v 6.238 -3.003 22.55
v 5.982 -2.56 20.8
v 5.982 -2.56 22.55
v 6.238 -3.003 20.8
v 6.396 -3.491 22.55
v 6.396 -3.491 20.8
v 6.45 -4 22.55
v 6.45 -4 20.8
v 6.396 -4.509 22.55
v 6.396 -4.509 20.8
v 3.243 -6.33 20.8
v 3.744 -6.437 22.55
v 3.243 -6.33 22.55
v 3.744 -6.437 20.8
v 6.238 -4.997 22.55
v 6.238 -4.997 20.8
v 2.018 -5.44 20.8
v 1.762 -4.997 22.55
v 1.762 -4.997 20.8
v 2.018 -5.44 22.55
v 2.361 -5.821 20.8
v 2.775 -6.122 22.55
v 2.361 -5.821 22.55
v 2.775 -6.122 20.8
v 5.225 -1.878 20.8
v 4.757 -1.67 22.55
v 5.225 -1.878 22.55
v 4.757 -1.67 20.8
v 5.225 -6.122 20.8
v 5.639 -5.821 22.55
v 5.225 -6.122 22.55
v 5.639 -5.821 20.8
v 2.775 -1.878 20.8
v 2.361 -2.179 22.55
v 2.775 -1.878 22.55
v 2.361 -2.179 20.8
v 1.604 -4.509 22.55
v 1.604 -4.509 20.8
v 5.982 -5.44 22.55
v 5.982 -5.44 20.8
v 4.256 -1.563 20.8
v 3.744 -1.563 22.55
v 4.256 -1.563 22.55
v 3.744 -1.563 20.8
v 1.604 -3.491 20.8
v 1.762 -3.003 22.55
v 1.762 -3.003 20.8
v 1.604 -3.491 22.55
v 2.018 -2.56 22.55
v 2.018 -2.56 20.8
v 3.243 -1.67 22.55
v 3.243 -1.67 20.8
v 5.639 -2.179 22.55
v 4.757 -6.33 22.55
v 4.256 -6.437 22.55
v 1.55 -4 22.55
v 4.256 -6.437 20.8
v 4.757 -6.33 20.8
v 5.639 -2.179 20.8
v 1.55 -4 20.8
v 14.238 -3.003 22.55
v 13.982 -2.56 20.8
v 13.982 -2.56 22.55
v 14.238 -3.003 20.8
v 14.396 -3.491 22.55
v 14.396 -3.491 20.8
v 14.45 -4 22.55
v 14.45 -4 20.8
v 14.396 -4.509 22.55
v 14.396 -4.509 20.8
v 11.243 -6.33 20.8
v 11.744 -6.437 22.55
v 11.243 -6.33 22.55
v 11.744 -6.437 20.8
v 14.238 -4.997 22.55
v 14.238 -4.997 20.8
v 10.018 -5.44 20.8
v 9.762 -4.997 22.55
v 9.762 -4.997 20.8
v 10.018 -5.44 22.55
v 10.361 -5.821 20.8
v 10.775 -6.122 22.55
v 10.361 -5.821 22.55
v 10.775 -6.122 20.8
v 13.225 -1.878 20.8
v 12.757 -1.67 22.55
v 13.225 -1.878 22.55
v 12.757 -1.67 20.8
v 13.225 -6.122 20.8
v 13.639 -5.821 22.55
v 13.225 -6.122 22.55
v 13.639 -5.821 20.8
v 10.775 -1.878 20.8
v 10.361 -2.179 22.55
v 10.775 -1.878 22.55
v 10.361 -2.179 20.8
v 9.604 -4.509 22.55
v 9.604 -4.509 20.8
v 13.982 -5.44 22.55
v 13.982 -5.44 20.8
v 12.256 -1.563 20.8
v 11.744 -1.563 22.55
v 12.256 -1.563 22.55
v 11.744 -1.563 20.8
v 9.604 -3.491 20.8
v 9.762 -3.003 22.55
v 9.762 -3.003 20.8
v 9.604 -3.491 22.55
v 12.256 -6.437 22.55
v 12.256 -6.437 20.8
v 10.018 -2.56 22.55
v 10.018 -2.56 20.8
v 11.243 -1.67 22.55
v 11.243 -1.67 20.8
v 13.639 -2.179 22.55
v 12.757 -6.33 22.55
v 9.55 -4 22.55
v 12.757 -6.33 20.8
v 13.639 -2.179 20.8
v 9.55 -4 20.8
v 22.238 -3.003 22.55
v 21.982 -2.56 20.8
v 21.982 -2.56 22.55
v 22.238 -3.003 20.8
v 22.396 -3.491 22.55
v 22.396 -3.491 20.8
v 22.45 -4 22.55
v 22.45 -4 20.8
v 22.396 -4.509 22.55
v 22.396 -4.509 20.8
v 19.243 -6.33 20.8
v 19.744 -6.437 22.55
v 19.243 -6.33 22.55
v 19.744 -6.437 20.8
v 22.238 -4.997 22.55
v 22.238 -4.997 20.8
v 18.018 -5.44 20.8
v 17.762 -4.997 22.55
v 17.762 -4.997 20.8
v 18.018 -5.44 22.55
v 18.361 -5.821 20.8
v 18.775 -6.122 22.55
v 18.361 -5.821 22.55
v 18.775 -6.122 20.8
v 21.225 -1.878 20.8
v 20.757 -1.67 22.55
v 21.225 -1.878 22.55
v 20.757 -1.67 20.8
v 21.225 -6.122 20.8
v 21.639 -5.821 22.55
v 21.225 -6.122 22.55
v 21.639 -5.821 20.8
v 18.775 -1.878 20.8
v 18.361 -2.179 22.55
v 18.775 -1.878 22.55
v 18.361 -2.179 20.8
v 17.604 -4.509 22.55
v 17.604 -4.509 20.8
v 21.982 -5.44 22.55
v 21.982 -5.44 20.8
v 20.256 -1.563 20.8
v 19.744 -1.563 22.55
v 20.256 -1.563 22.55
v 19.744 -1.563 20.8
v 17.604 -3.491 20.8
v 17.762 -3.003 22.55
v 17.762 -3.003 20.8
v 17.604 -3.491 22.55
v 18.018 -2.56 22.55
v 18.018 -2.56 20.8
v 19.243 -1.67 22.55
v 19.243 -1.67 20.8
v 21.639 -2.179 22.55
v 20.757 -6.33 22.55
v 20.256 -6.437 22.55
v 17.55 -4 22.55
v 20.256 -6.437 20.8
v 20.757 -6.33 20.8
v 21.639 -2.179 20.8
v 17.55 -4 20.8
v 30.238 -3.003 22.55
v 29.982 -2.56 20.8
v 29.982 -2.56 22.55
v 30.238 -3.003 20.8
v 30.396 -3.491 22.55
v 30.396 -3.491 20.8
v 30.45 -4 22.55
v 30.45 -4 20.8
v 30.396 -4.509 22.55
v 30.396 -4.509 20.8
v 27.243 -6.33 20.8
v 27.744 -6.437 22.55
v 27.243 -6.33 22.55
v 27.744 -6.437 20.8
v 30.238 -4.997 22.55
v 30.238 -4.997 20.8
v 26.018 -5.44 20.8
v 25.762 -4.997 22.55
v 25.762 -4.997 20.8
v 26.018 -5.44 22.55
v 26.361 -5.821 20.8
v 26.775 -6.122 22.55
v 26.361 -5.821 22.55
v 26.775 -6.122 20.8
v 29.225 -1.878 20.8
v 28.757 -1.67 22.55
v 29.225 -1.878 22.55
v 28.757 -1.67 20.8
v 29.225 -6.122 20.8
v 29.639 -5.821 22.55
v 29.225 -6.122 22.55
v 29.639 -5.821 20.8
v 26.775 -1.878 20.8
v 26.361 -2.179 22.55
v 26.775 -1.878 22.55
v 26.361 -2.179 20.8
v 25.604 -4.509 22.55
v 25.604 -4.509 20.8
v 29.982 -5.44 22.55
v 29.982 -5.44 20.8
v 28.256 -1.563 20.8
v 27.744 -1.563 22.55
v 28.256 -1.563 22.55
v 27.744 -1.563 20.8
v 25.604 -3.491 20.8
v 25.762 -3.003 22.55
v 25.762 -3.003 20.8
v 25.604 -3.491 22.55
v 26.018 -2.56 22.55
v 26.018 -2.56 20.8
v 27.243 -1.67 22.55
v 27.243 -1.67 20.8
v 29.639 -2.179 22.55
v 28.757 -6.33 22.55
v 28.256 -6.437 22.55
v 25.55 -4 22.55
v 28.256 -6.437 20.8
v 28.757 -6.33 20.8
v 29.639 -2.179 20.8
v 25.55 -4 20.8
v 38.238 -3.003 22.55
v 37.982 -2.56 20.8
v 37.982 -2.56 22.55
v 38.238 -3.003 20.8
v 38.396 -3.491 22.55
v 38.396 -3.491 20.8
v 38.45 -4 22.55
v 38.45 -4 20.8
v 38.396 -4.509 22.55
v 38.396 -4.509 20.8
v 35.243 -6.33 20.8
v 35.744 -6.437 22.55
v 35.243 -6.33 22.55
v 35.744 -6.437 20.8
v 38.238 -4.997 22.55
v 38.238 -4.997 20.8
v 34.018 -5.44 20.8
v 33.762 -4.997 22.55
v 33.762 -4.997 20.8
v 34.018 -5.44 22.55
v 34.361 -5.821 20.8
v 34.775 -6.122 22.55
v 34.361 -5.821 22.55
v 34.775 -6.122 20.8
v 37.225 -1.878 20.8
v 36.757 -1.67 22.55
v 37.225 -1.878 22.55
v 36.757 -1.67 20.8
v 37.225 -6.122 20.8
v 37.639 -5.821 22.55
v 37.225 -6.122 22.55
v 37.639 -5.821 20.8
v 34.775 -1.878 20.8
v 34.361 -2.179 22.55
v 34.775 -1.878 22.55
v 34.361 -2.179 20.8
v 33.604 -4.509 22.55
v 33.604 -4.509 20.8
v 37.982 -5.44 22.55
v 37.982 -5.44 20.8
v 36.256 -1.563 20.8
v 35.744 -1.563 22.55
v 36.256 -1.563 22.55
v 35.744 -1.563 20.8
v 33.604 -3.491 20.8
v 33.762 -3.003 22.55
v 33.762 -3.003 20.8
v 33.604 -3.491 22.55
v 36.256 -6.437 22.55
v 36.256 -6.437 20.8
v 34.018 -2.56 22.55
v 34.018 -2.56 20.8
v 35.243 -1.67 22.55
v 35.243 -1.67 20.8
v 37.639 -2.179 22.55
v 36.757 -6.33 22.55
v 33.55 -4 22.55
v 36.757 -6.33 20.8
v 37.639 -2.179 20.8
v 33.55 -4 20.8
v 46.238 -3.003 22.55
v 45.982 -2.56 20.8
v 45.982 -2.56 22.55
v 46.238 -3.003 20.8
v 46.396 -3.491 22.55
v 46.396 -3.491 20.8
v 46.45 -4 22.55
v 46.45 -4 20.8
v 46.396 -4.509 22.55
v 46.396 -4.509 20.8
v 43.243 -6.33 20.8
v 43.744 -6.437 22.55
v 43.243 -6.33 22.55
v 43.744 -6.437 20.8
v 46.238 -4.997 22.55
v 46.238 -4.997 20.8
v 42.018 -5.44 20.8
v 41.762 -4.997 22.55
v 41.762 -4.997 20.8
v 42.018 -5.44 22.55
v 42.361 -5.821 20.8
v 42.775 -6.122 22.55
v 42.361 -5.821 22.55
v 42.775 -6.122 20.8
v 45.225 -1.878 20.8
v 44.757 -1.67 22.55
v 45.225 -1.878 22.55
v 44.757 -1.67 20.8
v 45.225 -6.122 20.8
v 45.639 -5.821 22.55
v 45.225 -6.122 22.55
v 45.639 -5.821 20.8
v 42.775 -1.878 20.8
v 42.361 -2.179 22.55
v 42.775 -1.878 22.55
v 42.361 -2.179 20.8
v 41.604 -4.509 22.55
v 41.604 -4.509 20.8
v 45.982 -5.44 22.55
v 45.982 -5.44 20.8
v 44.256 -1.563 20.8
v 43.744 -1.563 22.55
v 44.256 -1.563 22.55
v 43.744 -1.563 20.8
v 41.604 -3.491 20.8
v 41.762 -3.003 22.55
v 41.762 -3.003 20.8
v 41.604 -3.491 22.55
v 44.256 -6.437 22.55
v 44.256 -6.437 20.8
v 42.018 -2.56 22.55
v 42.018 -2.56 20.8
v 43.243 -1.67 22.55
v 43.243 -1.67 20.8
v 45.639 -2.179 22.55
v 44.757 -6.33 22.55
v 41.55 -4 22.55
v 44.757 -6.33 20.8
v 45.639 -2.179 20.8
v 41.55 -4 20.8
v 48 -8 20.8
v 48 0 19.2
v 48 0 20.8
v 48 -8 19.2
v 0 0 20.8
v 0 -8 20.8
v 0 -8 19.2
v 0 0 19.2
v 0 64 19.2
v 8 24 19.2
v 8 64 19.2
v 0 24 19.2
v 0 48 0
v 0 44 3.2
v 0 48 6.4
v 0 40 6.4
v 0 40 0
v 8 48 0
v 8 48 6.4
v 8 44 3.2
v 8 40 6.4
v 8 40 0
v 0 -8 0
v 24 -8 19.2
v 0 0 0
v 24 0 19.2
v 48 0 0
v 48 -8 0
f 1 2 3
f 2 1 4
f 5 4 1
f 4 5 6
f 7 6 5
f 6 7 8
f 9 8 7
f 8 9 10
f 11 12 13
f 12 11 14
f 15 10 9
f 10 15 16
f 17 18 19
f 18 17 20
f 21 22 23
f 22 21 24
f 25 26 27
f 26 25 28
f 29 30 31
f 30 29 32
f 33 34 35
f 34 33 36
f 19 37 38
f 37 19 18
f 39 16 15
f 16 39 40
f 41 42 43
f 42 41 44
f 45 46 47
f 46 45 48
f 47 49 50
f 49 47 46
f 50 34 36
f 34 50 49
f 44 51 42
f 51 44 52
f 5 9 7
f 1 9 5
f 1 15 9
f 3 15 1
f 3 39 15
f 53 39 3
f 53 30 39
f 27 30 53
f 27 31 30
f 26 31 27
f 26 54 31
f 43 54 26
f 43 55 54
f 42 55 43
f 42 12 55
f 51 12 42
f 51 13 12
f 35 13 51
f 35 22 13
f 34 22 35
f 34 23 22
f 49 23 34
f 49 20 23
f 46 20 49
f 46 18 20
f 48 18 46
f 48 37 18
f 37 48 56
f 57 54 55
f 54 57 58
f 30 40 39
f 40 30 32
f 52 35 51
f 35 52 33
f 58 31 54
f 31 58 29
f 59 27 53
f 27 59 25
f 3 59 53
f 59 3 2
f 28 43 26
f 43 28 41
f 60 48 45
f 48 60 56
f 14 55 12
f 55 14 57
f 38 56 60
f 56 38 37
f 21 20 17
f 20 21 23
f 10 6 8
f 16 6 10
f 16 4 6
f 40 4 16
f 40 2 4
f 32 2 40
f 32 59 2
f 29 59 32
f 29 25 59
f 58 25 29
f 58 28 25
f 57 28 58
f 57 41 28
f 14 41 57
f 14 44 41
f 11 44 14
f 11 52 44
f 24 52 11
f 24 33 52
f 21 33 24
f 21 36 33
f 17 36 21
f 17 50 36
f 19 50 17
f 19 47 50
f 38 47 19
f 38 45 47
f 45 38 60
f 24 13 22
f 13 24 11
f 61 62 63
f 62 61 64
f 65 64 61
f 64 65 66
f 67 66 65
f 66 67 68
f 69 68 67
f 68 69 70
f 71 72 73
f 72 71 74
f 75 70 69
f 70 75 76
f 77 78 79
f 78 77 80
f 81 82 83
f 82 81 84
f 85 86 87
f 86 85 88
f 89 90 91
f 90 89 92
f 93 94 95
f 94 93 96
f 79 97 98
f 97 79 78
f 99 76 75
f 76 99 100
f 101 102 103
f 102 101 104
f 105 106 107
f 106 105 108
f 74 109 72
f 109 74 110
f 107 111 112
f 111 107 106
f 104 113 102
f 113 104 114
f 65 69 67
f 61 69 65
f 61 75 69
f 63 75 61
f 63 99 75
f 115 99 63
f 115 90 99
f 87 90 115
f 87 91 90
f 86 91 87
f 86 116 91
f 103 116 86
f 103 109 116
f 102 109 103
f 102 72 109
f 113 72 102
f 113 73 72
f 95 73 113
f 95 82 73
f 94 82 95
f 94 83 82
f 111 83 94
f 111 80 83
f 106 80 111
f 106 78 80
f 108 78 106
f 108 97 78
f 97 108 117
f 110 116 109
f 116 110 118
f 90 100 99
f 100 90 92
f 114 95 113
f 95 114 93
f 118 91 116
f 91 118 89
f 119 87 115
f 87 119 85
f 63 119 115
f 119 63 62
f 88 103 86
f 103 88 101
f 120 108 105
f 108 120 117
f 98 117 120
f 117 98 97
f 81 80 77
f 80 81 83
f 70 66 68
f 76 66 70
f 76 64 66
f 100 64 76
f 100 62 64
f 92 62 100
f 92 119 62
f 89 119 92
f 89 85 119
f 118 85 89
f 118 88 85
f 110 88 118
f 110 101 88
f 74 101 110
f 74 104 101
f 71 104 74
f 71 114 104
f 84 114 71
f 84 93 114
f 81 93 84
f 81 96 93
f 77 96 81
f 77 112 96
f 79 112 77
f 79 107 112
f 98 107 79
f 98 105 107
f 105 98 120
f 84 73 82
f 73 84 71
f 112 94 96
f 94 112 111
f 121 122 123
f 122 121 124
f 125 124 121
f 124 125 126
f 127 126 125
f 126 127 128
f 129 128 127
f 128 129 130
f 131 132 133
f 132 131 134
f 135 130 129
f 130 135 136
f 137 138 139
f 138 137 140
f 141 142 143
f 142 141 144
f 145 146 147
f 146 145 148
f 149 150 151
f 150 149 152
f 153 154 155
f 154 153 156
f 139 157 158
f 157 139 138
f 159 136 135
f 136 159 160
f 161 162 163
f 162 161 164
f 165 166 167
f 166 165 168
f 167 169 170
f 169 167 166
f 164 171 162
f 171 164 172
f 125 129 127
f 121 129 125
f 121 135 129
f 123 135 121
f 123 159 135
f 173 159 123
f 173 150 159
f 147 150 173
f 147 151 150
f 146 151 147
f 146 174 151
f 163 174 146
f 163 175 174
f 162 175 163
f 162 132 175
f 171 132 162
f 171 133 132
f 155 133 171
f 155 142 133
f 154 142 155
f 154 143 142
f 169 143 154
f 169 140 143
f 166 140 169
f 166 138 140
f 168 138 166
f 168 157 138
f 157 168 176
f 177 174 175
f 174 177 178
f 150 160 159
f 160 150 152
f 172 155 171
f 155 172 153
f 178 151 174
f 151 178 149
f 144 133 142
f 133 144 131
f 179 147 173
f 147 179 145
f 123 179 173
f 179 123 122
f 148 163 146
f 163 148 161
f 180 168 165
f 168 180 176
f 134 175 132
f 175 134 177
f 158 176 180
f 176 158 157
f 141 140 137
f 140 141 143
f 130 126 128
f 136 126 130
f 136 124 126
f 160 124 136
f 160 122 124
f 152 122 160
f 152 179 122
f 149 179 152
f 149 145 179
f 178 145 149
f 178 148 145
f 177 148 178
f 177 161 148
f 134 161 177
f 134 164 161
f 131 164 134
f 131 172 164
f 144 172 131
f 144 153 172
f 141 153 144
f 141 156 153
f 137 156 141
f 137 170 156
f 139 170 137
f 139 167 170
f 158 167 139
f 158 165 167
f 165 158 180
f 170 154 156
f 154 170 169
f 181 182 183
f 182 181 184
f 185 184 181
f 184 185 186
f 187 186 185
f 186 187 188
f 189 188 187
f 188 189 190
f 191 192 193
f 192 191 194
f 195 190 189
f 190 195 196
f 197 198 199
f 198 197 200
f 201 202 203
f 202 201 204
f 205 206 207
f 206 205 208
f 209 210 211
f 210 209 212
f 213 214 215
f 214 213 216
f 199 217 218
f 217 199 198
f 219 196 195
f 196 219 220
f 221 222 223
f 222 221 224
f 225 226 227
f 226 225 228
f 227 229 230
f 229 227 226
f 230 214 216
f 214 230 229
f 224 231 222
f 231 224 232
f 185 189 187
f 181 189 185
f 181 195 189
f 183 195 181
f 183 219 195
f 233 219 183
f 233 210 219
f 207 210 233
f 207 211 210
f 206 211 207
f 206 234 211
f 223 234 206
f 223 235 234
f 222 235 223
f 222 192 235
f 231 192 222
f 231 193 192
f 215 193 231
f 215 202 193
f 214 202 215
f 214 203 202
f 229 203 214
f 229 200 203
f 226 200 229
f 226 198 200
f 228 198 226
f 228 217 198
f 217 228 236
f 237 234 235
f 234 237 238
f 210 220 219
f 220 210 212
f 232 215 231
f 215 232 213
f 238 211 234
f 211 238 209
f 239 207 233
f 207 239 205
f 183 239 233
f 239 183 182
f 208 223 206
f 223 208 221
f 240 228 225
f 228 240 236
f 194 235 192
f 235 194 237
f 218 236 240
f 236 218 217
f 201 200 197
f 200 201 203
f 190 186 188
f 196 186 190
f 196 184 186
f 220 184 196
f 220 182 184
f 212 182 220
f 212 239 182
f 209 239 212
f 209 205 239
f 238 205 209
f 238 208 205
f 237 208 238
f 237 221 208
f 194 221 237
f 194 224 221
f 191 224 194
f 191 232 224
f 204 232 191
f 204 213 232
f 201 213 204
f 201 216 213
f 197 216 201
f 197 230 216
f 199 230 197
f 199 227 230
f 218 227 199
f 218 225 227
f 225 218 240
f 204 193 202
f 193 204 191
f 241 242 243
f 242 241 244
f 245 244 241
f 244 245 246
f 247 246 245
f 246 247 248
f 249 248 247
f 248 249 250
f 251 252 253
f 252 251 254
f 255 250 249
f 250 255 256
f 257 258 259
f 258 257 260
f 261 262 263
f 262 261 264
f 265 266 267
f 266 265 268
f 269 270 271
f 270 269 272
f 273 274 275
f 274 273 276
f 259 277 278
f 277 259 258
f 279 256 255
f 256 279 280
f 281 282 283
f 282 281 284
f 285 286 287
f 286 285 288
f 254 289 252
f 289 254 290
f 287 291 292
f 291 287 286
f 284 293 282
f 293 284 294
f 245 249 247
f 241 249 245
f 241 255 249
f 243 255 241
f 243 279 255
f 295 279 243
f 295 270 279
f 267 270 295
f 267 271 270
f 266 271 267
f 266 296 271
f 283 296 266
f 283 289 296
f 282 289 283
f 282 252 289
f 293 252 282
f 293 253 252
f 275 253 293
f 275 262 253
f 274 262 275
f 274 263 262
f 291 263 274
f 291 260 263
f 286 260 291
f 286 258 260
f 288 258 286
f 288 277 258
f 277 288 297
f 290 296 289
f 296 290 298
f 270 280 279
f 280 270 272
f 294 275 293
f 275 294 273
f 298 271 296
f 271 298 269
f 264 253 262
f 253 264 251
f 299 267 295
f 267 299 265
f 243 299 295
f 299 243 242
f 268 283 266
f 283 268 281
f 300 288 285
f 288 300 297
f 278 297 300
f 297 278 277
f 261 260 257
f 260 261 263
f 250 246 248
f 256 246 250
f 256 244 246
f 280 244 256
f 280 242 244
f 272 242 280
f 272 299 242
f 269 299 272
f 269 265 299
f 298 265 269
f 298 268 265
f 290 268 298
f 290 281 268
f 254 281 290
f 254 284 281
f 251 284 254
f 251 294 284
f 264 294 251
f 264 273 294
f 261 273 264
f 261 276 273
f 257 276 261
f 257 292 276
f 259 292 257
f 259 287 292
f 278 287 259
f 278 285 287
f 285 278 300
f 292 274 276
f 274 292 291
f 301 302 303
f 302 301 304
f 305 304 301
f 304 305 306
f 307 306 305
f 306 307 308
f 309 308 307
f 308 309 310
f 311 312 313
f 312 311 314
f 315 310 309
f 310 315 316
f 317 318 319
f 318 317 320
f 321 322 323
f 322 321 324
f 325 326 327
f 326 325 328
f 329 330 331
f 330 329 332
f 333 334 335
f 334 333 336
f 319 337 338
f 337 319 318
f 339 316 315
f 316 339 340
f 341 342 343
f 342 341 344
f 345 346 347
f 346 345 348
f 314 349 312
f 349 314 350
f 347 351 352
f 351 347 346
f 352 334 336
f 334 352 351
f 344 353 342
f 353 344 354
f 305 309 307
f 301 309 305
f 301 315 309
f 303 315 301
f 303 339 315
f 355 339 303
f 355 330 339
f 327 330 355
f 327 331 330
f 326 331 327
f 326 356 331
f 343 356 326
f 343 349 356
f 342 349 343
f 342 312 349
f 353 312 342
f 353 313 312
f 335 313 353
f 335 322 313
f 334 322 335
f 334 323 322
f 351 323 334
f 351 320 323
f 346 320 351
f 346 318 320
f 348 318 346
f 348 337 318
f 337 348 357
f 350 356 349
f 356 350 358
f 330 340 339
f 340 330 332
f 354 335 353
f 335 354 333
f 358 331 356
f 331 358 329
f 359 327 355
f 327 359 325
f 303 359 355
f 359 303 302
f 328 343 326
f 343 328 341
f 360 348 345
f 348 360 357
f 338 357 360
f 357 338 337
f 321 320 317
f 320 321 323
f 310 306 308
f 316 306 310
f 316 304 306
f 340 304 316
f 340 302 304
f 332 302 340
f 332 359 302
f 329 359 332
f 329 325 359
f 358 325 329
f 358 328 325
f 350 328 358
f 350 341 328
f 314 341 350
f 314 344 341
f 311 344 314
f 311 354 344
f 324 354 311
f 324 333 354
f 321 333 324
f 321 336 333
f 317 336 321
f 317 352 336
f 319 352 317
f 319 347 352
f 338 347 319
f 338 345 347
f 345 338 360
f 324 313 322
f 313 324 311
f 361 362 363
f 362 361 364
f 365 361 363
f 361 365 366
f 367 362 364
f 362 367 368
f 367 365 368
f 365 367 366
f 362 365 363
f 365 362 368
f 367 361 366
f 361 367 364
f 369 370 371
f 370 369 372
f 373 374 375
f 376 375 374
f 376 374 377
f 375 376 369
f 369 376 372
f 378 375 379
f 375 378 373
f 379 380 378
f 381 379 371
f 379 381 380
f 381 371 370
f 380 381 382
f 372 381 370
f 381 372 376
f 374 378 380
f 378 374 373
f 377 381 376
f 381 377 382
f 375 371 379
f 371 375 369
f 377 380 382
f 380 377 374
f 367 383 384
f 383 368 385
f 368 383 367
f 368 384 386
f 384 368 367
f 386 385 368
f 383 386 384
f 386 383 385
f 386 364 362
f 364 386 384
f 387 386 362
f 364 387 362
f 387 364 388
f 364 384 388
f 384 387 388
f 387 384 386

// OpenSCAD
// file: ../lib/doblo-params.scad
/*
 Copyright (c) 2013 Daniel M. Taub
 Copyright (c) 2010 Daniel K. Schneider

 This file is part of DobloFactory.

 DobloFactory is free source: you can redistribute it and/or modify
    modify it under the terms of the CC BY-NC-SA 3.0 License:
    CreativeCommons Attribution-NonCommerical-ShareAlike 3.0
    as published by Creative Commons.

    You should have received a copy of the CC BY-NC-SA 3.0 License
    with this source package.
    If not, see <http://creativecommons.org/licenses/by-nc-sa/3.0/>

-------------------------
PARAMETERS              -
-------------------------

These define in principle all dimensions.

Close to DUPLO dimensions by default. Depending on your printer and your layer/thickness printing parameters you do want to change nibbles and walls. The settings below are for a layer Thickness of 0.25mm

All units are mm.

Dimensions:
* A typical small 2x2 nibbles on top DUPLO compatible brick with one nibble underneath is
32mm x 32mm x 19.2mm (plus a nibble height of 4.5mm)
* LEGO-compatible bricks are half that size in all three dimensions

*/

// Normal size (DUPLO)
// SCALE = 1;
// Lego size - see also the hacks in the code for fixing wall and nibble dimensions
// SCALE = 0.5 ;
// Mini Lego size / Nano - does not really work yet, but you can try
// SCALE = 0.25

// DATA FOR QUATRO (DMT)
// nibble outter diam: 18.45
// nibble inner diam: 14.45
// nibble inner nub(for duplo) diam: 13.25

CADRO = 2; // not yet tested
DOBLO = 1;
LUGO = 0.5;
MINI = 0.25; // not tested much

HALF=3;
THIRD=2;
THIRDx2=4;
FULL=6;

// defines minimum size of a fragment of a nibble, e.g. set openscad $fs
// Smaller is better, but will take much more time for rendering and slicing
NIBBLE_FS = 0.5;
CYL_FS = 2;

// LEGO SCALE - don't change, allows to create nano legos, should be 1 if real Legos
function LEGO_SCALE(SCALE) = 2 * SCALE;

// Doblo block size
// Real DUPLO Block = 31.7 / 2 = 15.85 (with some variations)
function PART_WIDTH(SCALE)  = 16.0  * SCALE;

// Block height (a typical block is 4 * PART_HEIGHT)
// Real Duplo Block = 19.17 / 4 = 4.8, we also measured 19.09, 19.16
function PART_HEIGHT(SCALE)  = (SCALE < 0.6) ? ( 1.6 * LEGO_SCALE(SCALE) ) : ( 3.2 * SCALE );
// Diamonds - size of anti-warping holes - used optionally
DIAMOND = 4;

// Top nibble size definitions
// Must be adjusted with respect to layer resolution and other slicing considerations
function NO(SCALE)         = PART_WIDTH(SCALE) / 2.0;              //nibble offset
function NBO(SCALE)        = PART_WIDTH(SCALE);                   // nibble bottom offset
function NH(SCALE)         = (SCALE < 0.6) ? 1.75 * LEGO_SCALE(SCALE) : 4.55 * SCALE;  // LEGO vs. DUPLO
function NB_RADIUS(SCALE)  = (SCALE < 0.6) ? (4.9 / 2 * LEGO_SCALE(SCALE)) : (9.2 / 2.0 * SCALE);  // Lego vs. DUPLO

// Real DUPLO Block = 9.38
function NB_RADIUS_INSIDE(SCALE) = 6.8/2  * SCALE;
// 6.44 = Real DUPLO block

function NB_THICKNESS(SCALE)=NB_RADIUS(SCALE)-NB_RADIUS_INSIDE(SCALE);

// For square nibble supports in 1xM or Nx1 blocks
function ALONG_LEN(SCALE)  = (PART_WIDTH(SCALE)-NB_RADIUS(SCALE))/1.7; //tighter fit than 1.8
function CROSS_LEN(SCALE)  = (PART_WIDTH(SCALE)-NB_RADIUS(SCALE)/2);

// Bottom nibbles size definitions
// Must be adjusted with respect to layer resolution and other slicing considerations
function NB_BOTTOM_RADIUS(SCALE)        = (SCALE < 0.6) ? 6.5/2*LEGO_SCALE(SCALE) : 13.4/2*SCALE;
function NB_BOTTOM_RADIUS_THIN(SCALE)   = (SCALE < 0.6) ? 3.5/2*LEGO_SCALE(SCALE) : 7.2/2*SCALE;
// Real DUPLO = 13.48
function NB_BOTTOM_RADIUS_INSIDE(SCALE) = (SCALE < 0.6) ? 4.8/2*LEGO_SCALE(SCALE) : 10.8/2*SCALE;
// Real DUPLO = 10.73
// rapman 10.6
// Real Lego = 4.9

// walls - IMPORTANT: must be adjusted with respect to layer resolution and other slicing considerations
function DOBLOWALL(SCALE) = (SCALE < 0.6) ? 1.2 * LEGO_SCALE(SCALE): 1.55 *SCALE;
// Lego vs. Duplo, Lego is not 2x smaller
// Real Lego = 1.2

function USE_INSET(SCALE) = (SCALE < 0.6) ? true : true;
function INSET_WIDTH(SCALE)    = (SCALE < 0.6) ? 0.4 *LEGO_SCALE(SCALE) : 1.50 * SCALE; //little inset walls to make it stick
function INSET_LENGTH(SCALE)  = (SCALE < 0.6) ? 3*DOBLOWALL(SCALE) : 4*DOBLOWALL(SCALE); // Legos have proportionally smaller insets

//lattice width and height (optional, see LATTICE_TYPE)
// A grid underneath the flat bridge, crossing through the nibbles underneath
function LATTICE_WIDTH(SCALE)   = 1.50 * SCALE;

// 0 means none, 1 means more spacing (same as nibbles underneath),
// 2 means denser
LATTICE_TYPE    = 1;

// Sizes of a standard 2x2 square brick, normal height
// Not used, but are practical in your custom modules
function DOBLOWIDTH(SCALE)  = PART_WIDTH(SCALE)  * 2.0  * SCALE;
function DOBLOHEIGHT(SCALE) = PART_HEIGHT(SCALE) * 6.0  * SCALE;
function LEGOHEIGHT(SCALE)  = PART_HEIGHT(SCALE) * 6.0  * SCALE;
// main file
include <../doblo-factory.scad>;
include <../lib/doblo-params.scad>;

// (col=0,row=0,up=0,height=FULL,angle=0,thickness=1, scale)

color ("pink") support    (col=0, row=-6, up=0, height=2*FULL, angle=270, thickness=1, scale=LUGO) ;
color ("pink") support    (col=0, row=-6, up=0, height=2*FULL, angle=90, thickness=1, scale=LUGO) ;

color ("red") support     (0,     0,     0,    2*FULL,        0,       1,           LUGO) ;
color ("yellow") support   (5,  0,   0,   2*FULL,   180, 1, LUGO) ;
color ("lime") block      (0,  0,   2*FULL,  6,    1,   1, true, LUGO);
